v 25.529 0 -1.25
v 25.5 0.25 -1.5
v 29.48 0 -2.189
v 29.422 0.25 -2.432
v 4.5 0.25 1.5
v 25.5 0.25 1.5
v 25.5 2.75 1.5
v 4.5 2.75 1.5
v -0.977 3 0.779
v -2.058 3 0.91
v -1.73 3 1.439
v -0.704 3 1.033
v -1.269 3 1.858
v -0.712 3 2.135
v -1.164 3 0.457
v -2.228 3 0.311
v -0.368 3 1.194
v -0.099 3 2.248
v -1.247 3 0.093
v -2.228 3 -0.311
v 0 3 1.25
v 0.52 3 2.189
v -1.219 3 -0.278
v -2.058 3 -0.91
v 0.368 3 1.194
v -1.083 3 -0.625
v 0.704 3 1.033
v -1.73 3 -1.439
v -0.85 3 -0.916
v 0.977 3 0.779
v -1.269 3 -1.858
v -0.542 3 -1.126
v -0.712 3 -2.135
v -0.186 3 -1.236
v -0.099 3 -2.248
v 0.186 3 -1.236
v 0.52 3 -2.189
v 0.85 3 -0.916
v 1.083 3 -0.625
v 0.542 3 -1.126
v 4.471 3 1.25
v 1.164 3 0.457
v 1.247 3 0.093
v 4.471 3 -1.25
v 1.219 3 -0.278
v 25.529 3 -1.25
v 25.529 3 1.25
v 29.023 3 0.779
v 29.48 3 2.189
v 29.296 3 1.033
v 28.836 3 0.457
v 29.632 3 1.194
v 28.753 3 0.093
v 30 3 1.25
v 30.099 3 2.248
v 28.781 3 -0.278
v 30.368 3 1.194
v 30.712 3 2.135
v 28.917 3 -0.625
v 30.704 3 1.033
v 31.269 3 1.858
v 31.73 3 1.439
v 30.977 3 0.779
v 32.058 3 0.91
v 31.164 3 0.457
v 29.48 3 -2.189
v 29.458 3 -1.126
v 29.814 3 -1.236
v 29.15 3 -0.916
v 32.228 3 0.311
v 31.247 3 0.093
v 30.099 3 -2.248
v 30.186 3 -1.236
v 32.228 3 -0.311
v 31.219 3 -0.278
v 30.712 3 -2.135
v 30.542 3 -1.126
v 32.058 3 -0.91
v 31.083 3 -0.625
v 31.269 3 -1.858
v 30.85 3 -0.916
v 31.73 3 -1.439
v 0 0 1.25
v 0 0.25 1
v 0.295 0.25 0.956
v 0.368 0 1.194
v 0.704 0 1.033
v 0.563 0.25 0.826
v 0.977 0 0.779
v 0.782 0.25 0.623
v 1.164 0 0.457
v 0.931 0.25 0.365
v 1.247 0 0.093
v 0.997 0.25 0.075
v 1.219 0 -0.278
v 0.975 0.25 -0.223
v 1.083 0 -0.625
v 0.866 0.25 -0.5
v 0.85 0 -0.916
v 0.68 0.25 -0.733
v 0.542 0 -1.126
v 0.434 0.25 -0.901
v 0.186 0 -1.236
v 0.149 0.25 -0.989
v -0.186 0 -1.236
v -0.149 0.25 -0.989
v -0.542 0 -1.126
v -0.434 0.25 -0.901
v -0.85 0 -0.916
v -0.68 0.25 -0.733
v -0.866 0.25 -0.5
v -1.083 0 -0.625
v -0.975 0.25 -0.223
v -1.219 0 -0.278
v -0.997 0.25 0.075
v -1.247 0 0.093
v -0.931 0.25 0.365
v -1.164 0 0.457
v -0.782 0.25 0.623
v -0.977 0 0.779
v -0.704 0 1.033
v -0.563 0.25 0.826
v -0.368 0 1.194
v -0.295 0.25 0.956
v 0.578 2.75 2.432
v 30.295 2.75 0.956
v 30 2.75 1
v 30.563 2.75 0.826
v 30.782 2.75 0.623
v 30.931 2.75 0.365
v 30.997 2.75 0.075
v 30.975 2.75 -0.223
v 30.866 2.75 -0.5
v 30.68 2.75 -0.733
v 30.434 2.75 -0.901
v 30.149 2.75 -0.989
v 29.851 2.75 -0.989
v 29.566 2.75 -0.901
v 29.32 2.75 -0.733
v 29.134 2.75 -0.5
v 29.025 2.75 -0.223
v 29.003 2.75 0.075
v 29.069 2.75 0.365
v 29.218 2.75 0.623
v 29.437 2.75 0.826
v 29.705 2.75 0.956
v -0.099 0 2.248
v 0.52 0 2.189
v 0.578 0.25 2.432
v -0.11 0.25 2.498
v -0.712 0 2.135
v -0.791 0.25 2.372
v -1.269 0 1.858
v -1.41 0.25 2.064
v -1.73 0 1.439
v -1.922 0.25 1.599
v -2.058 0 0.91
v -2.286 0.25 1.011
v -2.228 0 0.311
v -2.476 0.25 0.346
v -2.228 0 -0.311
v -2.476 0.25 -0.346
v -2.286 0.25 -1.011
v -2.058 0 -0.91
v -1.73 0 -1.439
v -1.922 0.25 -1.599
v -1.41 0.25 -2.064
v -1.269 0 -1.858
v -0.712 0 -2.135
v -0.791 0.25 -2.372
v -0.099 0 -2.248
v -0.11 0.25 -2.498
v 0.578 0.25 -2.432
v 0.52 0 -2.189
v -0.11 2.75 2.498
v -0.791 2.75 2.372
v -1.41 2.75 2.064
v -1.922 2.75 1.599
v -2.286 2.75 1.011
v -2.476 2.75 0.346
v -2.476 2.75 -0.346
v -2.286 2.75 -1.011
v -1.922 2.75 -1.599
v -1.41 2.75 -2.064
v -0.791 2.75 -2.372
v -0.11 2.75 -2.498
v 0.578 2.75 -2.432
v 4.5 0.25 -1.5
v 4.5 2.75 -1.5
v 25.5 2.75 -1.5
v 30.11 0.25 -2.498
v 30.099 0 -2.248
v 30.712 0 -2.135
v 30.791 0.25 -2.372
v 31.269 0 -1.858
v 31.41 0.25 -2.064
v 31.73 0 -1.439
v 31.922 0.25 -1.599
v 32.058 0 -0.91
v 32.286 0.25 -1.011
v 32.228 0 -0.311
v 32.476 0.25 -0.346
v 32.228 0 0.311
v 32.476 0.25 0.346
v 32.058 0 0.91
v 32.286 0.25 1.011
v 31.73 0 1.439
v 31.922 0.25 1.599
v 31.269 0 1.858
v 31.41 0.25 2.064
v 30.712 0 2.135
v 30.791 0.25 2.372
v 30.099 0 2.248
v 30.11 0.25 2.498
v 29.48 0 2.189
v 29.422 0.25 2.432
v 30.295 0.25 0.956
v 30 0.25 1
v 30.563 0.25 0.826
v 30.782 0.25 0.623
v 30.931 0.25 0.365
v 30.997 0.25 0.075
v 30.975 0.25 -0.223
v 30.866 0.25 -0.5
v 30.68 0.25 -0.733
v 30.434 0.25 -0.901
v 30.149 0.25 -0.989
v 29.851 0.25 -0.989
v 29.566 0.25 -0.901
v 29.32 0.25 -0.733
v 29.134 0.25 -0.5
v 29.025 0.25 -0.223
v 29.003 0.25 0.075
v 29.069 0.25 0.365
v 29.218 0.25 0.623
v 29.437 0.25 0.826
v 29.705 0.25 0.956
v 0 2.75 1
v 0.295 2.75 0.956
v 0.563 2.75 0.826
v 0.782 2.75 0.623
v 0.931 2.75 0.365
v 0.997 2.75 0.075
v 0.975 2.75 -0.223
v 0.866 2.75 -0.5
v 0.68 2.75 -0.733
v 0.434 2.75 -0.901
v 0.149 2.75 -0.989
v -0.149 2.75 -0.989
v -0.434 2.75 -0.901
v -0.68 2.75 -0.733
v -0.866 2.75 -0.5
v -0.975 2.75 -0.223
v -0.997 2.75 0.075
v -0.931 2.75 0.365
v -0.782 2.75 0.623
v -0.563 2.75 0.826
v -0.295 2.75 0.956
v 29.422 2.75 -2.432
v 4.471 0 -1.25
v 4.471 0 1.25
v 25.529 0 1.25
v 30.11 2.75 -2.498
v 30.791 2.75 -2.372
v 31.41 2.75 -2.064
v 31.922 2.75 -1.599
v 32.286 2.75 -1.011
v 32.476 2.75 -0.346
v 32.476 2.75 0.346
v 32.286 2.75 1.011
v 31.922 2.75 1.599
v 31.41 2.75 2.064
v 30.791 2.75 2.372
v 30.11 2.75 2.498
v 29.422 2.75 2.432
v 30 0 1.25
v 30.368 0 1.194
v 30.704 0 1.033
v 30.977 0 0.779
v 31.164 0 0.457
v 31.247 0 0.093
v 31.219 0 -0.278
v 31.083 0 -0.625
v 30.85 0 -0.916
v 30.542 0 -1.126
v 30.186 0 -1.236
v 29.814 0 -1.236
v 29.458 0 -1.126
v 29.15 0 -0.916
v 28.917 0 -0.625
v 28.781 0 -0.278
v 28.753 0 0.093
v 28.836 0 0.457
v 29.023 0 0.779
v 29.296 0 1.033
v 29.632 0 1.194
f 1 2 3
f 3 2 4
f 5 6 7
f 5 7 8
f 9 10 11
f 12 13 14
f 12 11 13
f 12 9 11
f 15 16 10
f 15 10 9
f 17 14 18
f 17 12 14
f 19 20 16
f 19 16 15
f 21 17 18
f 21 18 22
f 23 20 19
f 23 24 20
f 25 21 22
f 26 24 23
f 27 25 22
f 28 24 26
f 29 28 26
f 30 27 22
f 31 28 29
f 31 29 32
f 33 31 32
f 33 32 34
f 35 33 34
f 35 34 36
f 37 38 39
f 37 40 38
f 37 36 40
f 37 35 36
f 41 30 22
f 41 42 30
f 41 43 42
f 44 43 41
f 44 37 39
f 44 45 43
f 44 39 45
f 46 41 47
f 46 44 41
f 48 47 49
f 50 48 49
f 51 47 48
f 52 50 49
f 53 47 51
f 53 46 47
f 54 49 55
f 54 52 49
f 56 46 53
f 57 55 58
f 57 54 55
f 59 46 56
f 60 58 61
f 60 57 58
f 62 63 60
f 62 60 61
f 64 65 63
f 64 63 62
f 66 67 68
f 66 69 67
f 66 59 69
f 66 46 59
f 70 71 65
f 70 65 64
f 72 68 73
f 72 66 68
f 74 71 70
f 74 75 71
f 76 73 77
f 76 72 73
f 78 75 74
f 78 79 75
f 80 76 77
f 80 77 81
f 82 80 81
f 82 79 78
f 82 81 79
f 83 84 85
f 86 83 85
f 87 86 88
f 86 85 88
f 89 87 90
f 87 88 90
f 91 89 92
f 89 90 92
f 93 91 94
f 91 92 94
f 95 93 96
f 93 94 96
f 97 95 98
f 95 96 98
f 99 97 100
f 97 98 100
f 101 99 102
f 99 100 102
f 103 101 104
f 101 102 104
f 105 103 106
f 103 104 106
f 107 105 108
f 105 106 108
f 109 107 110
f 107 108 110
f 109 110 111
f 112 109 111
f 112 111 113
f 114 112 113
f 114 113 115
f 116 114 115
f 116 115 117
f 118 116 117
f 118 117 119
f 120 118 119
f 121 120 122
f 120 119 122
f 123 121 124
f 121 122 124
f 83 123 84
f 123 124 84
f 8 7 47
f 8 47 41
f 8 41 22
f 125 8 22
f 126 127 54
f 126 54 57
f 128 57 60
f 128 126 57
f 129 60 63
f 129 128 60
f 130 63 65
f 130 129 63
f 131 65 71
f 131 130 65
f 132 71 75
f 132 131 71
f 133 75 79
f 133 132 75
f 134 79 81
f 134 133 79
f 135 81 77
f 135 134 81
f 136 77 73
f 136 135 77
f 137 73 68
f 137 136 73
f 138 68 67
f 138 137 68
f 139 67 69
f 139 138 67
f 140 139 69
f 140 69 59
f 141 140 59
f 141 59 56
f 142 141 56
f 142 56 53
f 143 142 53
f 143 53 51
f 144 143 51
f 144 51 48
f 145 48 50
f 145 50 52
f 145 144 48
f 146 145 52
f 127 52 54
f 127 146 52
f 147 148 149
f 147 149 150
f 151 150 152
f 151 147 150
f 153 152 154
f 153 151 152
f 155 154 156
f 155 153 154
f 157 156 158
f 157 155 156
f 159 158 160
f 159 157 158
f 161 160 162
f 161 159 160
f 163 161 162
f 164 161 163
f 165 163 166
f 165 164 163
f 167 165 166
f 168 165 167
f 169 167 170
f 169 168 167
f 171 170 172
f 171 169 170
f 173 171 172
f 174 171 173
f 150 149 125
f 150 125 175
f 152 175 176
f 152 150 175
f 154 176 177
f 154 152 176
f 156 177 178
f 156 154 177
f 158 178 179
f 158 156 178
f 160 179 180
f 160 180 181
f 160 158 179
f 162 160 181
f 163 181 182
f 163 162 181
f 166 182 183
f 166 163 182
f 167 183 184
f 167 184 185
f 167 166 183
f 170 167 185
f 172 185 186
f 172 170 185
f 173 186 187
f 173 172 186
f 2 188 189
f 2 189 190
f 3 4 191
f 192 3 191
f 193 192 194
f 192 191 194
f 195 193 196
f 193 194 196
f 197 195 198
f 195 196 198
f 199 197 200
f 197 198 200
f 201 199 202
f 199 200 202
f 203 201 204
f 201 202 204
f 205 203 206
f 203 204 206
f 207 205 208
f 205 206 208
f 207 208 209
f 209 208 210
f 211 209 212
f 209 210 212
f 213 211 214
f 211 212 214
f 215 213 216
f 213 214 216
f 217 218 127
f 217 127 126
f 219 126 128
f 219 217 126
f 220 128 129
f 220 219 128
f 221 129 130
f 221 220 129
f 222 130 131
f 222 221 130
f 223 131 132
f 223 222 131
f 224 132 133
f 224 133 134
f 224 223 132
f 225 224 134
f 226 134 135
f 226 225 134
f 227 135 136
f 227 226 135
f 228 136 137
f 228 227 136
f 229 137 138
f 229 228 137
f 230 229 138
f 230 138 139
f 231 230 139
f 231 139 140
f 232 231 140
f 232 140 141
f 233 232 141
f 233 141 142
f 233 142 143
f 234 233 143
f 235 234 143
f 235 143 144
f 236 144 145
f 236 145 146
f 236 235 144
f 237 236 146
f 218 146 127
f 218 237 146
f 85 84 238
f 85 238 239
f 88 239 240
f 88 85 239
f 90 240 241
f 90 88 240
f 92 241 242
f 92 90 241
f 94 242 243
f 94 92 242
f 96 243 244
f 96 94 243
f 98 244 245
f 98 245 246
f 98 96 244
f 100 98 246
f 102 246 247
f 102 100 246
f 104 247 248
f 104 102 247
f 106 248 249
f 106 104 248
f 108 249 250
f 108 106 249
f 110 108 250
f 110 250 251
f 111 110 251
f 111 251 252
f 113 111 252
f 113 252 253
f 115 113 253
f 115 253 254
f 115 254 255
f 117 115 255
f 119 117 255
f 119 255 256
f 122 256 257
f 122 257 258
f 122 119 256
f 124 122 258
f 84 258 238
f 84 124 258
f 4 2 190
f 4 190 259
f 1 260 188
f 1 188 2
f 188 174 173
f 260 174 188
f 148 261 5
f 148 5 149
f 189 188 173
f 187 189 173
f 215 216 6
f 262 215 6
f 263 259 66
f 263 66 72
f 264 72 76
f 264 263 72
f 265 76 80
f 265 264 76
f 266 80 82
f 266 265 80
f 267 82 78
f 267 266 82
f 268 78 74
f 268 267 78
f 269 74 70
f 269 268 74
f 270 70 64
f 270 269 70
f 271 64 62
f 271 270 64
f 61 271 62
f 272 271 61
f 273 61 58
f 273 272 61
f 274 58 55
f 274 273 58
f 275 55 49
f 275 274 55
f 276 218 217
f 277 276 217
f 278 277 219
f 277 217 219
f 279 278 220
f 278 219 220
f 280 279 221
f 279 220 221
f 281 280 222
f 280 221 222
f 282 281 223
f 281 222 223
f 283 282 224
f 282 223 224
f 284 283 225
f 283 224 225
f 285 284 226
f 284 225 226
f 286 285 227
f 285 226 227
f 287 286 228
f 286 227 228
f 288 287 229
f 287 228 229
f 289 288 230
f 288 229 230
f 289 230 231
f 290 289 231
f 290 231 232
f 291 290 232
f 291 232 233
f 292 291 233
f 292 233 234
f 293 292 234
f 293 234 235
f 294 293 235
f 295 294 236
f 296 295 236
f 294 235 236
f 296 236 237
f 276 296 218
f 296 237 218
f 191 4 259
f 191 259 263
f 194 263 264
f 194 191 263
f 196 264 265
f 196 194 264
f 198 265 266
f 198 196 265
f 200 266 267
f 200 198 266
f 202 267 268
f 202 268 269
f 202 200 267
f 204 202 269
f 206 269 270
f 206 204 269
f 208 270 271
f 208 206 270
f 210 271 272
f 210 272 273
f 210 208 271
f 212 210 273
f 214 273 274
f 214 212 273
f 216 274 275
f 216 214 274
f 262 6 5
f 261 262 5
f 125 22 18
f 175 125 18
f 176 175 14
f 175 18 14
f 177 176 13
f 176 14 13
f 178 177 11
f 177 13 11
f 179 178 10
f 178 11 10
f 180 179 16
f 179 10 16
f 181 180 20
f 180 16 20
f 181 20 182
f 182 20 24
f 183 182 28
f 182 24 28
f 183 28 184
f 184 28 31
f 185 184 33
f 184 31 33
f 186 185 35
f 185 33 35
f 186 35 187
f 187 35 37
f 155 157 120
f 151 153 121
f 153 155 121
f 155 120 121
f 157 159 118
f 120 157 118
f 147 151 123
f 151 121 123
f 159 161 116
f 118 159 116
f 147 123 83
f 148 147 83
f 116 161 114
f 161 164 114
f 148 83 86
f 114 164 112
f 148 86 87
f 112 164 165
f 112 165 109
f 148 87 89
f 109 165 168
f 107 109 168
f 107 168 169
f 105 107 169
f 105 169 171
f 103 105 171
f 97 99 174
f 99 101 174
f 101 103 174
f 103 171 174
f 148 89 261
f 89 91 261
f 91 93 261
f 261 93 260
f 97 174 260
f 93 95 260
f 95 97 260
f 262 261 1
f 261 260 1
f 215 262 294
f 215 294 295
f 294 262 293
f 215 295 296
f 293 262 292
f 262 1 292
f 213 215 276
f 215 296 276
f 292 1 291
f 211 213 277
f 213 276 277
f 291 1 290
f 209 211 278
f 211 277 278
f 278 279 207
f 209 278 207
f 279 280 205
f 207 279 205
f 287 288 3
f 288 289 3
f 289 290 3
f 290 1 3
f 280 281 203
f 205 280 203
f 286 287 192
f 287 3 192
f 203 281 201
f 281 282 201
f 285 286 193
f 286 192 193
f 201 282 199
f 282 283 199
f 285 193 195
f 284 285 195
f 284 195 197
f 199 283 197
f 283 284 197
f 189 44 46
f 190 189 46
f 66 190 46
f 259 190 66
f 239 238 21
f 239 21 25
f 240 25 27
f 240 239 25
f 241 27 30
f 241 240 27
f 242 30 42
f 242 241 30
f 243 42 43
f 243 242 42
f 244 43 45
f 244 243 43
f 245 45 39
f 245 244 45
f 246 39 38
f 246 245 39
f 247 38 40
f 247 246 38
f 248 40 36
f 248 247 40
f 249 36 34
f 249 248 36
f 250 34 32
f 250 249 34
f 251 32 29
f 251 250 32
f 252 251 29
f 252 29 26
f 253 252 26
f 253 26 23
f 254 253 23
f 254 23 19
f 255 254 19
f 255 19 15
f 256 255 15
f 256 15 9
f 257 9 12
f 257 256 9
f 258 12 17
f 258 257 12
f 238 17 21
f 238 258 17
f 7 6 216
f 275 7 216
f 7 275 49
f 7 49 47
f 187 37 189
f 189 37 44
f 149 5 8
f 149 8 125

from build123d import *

# Parameters (mm, degrees)
EXTRUDE_1_DEPTH     = 3
SKETCH_2_R          = 1
CUT_EXTRUDE_1_DEPTH = 3
EXTRUDE_2_DEPTH     = 3
CHAMFER_1_SIZE      = 0.25


with BuildPart() as part:
    # 草图1 → 凸台-拉伸1 (new body)
    with BuildSketch(Plane(origin=(0, 0, 0), x_dir=(1, 0, 0), z_dir=(0, 1, 0))):
        with BuildLine():
            Line((2, 1.5), (28, 1.5))
            ThreePointArc((28, 1.5), (32.5, 0), (28, -1.5))
            Line((28, -1.5), (2, -1.5))
            ThreePointArc((2, -1.5), (-2.5, 0), (2, 1.5))
        make_face()
    extrude(amount=EXTRUDE_1_DEPTH)

    # 草图2 → 切除-拉伸1 (cut)
    with BuildSketch(Plane(origin=(0, 0, 0), x_dir=(1, 0, 0), z_dir=(0, 1, 0))):
        with Locations(Location((0, 0, 0), (0, 0, 270))):
            Circle(SKETCH_2_R)
        with Locations(Location((30, 0, 0), (0, 0, 270))):
            Circle(SKETCH_2_R)
    extrude(amount=CUT_EXTRUDE_1_DEPTH, mode=Mode.SUBTRACT)

    # 草图3 → 凸台-拉伸2 (add)
    with BuildSketch(Plane(origin=(0, 0, 0), x_dir=(1, 0, 0), z_dir=(0, 1, 0))):
        with BuildLine():
            Line((4.5, 1.5), (0.578145188, 2.432231104))
            ThreePointArc((0.578145188, 2.432231104), (1.370755945, 2.090700395), (2, 1.5))
            Line((2, 1.5), (4.5, 1.5))
        make_face()
        with BuildLine():
            Line((4.5, -1.5), (0.578145188, -2.432231104))
            ThreePointArc((0.578145188, -2.432231104), (1.370755945, -2.090700395), (2, -1.5))
            Line((2, -1.5), (4.5, -1.5))
        make_face()
        with BuildLine():
            Line((28, 1.5), (25.5, 1.5))
            Line((25.5, 1.5), (29.421854812, 2.432231104))
            ThreePointArc((29.421854812, 2.432231104), (28.629244055, 2.090700395), (28, 1.5))
        make_face()
        with BuildLine():
            Line((25.5, -1.5), (29.421854812, -2.432231104))
            ThreePointArc((29.421854812, -2.432231104), (28.629244055, -2.090700395), (28, -1.5))
            Line((28, -1.5), (25.5, -1.5))
        make_face()
    extrude(amount=EXTRUDE_2_DEPTH)

    # 倒角1
    chamfer_1_edges = [part.edges().sort_by_distance(p)[0] for p in [
        (0, 0, -1),
        (0, 3, -1),
        (30, 0, -1),
        (30, 3, -1),
        (-2.5, 0, 0),
        (-2.5, 3, 0),
        (2.539072594, 0, -1.966115552),
        (2.539072594, 3, -1.966115552),
        (15, 0, 1.5),
        (15, 3, 1.5),
        (2.539072594, 0, 1.966115552),
        (2.539072594, 3, 1.966115552),
        (32.5, 0, 0),
        (32.5, 3, 0),
        (27.460927406, 0, 1.966115552),
        (27.460927406, 3, 1.966115552),
        (15, 0, -1.5),
        (15, 3, -1.5),
        (27.460927406, 0, -1.966115552),
        (27.460927406, 3, -1.966115552),
    ]]
    chamfer(chamfer_1_edges, length=CHAMFER_1_SIZE)


solid = part.part
